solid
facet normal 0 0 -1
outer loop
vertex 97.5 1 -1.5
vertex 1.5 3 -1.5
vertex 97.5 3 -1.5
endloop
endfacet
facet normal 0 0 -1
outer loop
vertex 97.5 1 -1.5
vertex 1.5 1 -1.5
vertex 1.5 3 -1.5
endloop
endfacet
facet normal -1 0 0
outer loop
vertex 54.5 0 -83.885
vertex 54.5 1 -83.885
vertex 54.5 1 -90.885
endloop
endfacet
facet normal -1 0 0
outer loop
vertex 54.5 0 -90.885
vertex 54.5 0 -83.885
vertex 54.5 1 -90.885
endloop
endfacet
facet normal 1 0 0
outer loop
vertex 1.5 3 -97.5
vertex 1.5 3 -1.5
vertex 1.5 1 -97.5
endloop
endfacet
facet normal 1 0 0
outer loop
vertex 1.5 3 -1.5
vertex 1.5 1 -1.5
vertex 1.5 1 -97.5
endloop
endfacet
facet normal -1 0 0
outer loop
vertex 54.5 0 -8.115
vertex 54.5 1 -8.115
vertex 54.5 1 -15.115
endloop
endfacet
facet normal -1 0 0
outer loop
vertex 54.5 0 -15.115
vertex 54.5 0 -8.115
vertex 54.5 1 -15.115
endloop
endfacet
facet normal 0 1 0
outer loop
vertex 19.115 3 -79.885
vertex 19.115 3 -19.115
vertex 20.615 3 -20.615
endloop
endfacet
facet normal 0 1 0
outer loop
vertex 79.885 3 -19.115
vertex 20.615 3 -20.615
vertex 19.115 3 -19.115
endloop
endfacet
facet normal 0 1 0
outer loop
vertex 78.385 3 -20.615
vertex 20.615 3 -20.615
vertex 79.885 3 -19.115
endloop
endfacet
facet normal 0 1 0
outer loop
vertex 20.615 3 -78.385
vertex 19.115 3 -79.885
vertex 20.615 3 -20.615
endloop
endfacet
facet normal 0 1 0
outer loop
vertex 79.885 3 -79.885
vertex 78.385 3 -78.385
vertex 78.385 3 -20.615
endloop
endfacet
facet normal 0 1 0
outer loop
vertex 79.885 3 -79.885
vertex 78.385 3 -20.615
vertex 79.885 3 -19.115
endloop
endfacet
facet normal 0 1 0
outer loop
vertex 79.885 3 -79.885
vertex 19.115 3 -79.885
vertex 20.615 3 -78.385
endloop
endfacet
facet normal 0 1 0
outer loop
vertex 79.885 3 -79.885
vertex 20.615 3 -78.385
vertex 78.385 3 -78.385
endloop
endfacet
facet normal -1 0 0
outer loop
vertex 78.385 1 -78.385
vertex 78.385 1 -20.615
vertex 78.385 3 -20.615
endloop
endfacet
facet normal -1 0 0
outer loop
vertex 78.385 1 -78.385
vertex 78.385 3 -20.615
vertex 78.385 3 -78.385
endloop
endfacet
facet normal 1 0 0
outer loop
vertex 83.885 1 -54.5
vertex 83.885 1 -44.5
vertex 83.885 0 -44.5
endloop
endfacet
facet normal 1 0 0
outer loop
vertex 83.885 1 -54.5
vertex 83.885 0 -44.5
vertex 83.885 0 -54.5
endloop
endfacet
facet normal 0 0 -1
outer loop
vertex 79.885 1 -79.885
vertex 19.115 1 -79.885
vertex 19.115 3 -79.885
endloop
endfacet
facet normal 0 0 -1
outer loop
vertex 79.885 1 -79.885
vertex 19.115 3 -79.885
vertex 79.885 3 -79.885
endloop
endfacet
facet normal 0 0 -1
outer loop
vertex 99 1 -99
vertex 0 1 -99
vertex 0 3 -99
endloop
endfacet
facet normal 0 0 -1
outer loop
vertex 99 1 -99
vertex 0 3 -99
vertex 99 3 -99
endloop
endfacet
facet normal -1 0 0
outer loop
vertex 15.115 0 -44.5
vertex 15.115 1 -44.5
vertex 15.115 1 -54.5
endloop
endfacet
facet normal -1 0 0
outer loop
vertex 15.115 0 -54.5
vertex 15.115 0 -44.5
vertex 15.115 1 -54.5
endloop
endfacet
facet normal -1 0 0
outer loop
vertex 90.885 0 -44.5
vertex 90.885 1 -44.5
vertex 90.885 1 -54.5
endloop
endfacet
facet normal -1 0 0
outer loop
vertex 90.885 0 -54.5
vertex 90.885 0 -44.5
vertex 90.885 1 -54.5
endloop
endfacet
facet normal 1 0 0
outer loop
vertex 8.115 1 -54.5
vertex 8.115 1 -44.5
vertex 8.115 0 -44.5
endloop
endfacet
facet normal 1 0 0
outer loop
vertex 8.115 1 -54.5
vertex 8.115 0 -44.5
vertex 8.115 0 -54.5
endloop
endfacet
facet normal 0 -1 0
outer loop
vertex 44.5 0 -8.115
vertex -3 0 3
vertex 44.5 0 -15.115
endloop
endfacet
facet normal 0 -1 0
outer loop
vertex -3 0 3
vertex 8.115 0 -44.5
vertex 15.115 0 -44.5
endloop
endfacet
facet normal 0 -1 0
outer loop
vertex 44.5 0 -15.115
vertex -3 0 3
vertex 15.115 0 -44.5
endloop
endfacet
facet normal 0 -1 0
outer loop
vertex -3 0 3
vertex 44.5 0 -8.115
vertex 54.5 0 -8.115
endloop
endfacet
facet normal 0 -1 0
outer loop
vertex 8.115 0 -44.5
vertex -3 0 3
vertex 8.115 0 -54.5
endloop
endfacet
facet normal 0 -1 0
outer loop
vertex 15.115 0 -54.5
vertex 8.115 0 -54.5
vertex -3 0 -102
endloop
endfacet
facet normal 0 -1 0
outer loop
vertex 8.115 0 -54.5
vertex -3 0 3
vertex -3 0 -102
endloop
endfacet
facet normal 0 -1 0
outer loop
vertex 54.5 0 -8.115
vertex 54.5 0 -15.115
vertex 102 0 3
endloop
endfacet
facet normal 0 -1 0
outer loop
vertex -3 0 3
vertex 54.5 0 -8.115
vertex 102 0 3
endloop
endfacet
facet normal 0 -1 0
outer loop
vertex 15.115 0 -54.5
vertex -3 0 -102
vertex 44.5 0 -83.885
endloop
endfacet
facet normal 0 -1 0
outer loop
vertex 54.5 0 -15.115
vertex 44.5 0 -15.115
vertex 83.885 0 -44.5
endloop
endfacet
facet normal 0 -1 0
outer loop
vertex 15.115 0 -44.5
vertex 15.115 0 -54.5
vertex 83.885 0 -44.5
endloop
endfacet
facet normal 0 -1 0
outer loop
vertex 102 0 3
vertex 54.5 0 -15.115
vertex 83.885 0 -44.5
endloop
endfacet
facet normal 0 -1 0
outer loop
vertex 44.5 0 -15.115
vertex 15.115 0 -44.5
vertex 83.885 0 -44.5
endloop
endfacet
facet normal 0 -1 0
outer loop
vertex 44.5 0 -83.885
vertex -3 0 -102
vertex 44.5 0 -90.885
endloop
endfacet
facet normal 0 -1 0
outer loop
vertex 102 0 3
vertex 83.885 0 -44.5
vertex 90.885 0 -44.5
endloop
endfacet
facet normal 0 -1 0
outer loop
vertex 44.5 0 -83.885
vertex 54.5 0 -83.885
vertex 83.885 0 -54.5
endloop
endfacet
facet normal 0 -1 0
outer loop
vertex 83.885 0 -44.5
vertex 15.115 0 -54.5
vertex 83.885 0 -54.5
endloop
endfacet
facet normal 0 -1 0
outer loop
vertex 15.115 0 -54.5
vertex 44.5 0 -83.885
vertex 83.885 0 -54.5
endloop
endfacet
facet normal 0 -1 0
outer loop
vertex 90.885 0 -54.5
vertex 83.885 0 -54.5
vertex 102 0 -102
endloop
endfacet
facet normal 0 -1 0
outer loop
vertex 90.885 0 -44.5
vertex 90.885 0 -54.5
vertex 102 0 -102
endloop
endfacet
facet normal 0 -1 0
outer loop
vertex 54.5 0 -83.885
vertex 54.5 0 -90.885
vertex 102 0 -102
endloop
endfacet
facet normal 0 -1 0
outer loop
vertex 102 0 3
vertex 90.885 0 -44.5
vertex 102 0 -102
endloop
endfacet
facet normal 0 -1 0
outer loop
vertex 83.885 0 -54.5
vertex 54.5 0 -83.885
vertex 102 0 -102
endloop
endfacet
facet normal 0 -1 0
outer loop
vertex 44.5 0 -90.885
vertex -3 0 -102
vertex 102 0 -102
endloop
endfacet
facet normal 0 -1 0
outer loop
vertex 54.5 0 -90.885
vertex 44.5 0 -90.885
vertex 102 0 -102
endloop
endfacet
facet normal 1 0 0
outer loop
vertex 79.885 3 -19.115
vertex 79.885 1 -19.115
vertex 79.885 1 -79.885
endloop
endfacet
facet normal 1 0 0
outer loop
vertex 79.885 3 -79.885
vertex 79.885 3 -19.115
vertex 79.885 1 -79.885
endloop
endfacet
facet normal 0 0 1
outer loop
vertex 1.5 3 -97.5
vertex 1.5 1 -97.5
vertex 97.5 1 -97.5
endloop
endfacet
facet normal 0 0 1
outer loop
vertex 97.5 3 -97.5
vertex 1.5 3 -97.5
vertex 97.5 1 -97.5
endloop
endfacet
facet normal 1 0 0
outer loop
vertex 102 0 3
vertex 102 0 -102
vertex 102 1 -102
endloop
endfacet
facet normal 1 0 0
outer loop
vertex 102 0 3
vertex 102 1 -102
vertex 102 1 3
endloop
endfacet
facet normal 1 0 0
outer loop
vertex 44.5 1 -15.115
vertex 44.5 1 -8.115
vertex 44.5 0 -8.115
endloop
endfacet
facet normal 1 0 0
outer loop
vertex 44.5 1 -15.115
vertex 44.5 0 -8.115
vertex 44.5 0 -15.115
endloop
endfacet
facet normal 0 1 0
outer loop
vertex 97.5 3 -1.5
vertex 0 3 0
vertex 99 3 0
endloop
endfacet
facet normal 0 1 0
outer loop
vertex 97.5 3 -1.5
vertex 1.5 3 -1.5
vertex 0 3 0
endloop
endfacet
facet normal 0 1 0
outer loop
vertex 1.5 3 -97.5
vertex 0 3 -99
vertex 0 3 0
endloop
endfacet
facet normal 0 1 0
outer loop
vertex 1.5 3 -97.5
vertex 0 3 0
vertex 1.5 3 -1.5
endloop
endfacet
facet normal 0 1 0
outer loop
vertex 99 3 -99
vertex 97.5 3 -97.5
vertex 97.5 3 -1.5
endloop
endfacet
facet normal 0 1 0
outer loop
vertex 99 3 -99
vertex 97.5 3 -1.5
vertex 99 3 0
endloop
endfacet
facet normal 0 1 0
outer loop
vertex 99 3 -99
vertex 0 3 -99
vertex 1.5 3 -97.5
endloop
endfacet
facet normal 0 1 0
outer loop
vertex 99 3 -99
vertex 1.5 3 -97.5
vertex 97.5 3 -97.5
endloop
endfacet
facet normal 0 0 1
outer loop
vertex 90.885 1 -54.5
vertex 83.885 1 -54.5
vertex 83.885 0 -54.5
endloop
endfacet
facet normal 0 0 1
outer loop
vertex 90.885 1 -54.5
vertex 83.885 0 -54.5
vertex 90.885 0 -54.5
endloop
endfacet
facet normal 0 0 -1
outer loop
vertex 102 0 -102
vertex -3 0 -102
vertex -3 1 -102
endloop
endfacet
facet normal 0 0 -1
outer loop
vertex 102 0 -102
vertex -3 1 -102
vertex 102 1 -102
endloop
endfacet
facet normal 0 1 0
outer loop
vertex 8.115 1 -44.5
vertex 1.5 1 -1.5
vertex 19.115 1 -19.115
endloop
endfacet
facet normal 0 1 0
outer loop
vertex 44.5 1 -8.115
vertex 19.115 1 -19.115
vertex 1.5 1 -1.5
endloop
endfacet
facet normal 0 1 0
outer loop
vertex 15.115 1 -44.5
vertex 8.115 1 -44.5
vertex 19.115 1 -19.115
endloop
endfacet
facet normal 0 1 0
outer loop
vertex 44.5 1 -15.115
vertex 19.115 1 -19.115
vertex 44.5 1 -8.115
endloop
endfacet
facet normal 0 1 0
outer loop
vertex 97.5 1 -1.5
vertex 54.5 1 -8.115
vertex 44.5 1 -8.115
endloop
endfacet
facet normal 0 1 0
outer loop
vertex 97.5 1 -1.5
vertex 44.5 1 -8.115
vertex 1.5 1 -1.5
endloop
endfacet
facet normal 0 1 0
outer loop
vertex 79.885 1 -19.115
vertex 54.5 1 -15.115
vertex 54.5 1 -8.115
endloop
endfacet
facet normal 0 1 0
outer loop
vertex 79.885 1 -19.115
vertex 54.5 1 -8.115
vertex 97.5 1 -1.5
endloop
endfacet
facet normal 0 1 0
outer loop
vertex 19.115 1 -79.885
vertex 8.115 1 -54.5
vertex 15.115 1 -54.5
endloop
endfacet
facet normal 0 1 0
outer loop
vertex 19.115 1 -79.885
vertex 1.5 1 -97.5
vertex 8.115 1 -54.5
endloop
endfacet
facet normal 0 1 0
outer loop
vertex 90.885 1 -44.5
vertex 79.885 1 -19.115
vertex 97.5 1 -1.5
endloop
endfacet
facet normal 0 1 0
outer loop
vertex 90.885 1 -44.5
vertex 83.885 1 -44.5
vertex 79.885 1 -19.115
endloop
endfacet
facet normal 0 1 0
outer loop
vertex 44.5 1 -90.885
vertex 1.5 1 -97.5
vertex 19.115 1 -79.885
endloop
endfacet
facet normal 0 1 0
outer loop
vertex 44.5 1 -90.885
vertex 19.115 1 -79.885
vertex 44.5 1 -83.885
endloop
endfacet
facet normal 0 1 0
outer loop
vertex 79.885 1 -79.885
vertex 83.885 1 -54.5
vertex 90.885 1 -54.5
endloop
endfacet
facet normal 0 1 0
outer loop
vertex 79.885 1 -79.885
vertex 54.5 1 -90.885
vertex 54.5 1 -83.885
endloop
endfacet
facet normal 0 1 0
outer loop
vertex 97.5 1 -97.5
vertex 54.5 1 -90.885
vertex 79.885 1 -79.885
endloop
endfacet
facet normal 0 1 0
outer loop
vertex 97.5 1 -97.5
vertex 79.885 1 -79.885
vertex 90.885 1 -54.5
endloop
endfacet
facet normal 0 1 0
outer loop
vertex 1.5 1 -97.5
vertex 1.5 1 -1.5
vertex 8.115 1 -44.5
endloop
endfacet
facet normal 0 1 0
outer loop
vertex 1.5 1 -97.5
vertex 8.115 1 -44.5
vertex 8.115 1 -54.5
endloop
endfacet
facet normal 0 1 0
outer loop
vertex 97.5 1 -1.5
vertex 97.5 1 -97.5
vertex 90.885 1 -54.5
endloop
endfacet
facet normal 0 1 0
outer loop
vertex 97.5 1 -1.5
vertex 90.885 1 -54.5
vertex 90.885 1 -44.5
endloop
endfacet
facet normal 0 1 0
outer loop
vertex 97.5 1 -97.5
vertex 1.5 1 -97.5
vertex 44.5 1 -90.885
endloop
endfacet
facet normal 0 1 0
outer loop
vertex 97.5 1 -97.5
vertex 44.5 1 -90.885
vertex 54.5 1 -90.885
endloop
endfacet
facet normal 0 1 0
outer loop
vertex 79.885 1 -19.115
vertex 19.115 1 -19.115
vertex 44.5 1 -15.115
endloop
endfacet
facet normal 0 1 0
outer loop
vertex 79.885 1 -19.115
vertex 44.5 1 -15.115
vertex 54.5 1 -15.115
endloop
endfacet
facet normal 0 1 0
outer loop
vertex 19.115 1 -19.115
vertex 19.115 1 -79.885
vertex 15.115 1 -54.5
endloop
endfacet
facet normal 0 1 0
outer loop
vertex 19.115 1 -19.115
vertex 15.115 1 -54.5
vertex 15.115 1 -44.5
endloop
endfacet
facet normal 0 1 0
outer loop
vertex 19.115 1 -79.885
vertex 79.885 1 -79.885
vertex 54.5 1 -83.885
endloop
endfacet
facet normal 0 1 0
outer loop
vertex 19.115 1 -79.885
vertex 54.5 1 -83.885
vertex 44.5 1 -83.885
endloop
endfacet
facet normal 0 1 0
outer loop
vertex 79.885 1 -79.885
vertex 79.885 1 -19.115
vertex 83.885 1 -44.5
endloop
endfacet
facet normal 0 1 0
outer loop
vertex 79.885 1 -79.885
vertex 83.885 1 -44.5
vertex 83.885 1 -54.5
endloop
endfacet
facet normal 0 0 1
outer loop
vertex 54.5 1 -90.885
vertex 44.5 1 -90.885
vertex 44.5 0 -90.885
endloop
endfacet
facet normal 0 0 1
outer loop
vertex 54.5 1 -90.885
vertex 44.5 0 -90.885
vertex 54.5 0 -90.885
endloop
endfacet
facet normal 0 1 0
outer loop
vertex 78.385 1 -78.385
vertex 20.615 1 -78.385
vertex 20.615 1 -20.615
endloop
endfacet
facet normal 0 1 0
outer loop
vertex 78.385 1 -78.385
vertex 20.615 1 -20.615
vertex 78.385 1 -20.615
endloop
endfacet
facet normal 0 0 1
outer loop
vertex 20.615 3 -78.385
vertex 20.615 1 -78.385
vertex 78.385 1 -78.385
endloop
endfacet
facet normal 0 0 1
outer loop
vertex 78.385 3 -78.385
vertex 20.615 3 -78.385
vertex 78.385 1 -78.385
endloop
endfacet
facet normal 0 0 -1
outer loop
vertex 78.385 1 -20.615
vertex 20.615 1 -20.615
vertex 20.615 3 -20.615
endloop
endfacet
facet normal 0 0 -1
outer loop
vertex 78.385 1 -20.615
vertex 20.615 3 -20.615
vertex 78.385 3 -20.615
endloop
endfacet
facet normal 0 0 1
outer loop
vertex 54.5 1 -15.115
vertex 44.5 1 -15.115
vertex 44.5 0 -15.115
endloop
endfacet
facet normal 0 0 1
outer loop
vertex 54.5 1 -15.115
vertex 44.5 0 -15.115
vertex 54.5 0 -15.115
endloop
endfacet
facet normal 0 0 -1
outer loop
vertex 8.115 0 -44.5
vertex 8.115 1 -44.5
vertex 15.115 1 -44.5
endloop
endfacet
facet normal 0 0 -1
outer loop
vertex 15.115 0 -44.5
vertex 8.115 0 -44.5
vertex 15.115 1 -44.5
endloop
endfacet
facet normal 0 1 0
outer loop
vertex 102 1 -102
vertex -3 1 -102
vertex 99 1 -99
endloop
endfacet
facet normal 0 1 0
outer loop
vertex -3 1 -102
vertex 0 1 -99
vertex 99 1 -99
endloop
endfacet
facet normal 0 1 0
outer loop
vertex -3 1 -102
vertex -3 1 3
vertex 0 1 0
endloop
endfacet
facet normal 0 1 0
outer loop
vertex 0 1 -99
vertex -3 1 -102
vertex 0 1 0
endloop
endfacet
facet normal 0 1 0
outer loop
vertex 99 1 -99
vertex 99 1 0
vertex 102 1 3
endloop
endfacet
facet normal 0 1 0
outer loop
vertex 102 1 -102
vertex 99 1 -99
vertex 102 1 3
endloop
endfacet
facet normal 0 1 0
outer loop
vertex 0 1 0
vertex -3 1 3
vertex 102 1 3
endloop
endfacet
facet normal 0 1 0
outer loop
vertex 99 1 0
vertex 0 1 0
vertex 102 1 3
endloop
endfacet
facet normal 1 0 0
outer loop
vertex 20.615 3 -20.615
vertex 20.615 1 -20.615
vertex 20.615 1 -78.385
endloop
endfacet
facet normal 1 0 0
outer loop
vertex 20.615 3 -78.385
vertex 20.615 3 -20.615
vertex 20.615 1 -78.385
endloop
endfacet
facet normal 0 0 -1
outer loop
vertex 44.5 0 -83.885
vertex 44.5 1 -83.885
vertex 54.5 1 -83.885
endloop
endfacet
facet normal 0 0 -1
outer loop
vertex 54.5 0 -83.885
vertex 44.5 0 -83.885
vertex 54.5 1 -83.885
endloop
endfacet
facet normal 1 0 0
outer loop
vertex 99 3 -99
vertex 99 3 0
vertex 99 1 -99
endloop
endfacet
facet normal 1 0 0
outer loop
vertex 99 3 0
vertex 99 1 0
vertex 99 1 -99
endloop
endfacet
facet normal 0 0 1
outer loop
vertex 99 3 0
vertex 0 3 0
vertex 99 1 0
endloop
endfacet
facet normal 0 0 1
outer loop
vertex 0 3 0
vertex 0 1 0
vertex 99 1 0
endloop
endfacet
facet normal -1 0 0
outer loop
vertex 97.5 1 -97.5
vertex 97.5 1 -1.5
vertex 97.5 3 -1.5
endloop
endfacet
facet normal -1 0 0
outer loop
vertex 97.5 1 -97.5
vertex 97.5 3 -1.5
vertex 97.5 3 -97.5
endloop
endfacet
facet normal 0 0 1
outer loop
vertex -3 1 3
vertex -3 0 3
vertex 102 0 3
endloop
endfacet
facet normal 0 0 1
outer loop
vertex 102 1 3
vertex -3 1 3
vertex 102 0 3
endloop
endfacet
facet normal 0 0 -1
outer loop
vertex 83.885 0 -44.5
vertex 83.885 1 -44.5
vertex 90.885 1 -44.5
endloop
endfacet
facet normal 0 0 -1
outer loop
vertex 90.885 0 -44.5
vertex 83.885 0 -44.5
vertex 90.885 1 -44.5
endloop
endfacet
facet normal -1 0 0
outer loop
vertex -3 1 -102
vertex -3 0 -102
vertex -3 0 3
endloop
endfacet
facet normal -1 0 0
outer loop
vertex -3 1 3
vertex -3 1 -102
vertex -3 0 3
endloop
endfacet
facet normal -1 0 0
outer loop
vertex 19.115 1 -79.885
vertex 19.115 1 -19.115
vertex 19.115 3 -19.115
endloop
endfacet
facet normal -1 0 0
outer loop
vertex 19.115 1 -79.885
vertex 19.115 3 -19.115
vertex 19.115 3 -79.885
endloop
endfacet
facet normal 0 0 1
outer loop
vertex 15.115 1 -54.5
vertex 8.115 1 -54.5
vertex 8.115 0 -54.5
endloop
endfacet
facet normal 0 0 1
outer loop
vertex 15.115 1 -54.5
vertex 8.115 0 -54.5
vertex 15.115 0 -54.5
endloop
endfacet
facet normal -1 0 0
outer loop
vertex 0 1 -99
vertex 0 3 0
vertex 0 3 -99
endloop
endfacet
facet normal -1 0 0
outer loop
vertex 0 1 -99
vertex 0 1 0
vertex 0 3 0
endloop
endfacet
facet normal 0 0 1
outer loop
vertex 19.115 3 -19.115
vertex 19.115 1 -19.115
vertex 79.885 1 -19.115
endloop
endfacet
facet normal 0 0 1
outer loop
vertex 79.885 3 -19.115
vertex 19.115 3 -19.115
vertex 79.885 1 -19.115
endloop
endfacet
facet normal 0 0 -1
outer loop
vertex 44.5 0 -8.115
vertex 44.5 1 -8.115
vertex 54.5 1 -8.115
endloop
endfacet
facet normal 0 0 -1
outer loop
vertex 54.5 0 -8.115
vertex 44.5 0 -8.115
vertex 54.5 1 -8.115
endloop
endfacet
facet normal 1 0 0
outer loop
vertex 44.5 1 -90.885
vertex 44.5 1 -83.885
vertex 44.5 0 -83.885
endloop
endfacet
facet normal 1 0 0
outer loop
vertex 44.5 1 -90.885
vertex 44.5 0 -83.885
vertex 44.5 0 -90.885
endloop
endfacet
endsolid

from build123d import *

# Parameters (mm, degrees)
CROQUIS1_W              = 99
CROQUIS1_H              = 99
CROQUIS1_W_2            = 96
CROQUIS1_H_2            = 96
SALIENTE_EXTRUIR1_DEPTH = 2
CROQUIS2_W              = 96
CROQUIS2_H              = 5
CROQUIS2_H_2            = 8.6
SALIENTE_EXTRUIR2_DEPTH = 1
CROQUIS3_W              = 105
CROQUIS3_H              = 105
CROQUIS3_W_2            = 99
CROQUIS3_H_2            = 99
SALIENTE_EXTRUIR3_DEPTH = 1
CROQUIS6_W              = 96
CROQUIS6_H              = 96
SALIENTE_EXTRUIR5_DEPTH = 1
CROQUIS7_W              = 60.769249784
CROQUIS7_H              = 60.769249784
CROQUIS7_W_2            = 57.769249784
CROQUIS7_H_2            = 57.769249784
SALIENTE_EXTRUIR6_DEPTH = 2
CROQUIS8_W              = 10
CROQUIS8_H              = 7
CROQUIS8_W_2            = 7
CROQUIS8_H_2            = 10
CORTAR_EXTRUIR1_DEPTH   = 65
CROQUIS9_W              = 99
CROQUIS9_H              = 99
CROQUIS9_W_2            = 96
CROQUIS9_H_2            = 96
SALIENTE_EXTRUIR7_DEPTH = 1


with BuildPart() as part:
    # Croquis1 → Saliente-Extruir1 (new body)
    with BuildSketch(Plane(origin=(0, 0, 0), x_dir=(1, 0, 0), z_dir=(0, 1, 0))):
        with Locations((49.5, 49.5)):
            Rectangle(CROQUIS1_W, CROQUIS1_H)
        with Locations((49.5, 49.5)):
            Rectangle(CROQUIS1_W_2, CROQUIS1_H_2, mode=Mode.SUBTRACT)
    extrude(amount=SALIENTE_EXTRUIR1_DEPTH)

    # Croquis2 → Saliente-Extruir2 (add)
    with BuildSketch(Plane.XZ):
        with Locations((49.5, -52)):
            Rectangle(CROQUIS2_W, CROQUIS2_H)
        with Locations((49.5, -47)):
            Rectangle(CROQUIS2_W, CROQUIS2_H)
        with Locations((49.5, -67.4)):
            Rectangle(CROQUIS2_W, CROQUIS2_H_2)
        with Locations((49.5, -84.6)):
            Rectangle(CROQUIS2_W, CROQUIS2_H_2)
        with Locations((49.5, -31.6)):
            Rectangle(CROQUIS2_W, CROQUIS2_H_2)
        with Locations((49.5, -14.4)):
            Rectangle(CROQUIS2_W, CROQUIS2_H_2)
    extrude(amount=-SALIENTE_EXTRUIR2_DEPTH)

    # Croquis3 → Saliente-Extruir3 (add)
    with BuildSketch(Plane.XZ):
        with Locations((49.5, -49.5)):
            Rectangle(CROQUIS3_W, CROQUIS3_H)
        with Locations((49.5, -49.5)):
            Rectangle(CROQUIS3_W_2, CROQUIS3_H_2, mode=Mode.SUBTRACT)
    extrude(amount=-SALIENTE_EXTRUIR3_DEPTH)

    # Croquis6 → Saliente-Extruir5 (add)
    with BuildSketch(Plane(origin=(0, 1, 0), x_dir=(1, 0, 0), z_dir=(0, 1, 0))):
        with Locations((49.5, 49.5)):
            Rectangle(CROQUIS6_W, CROQUIS6_H)
    extrude(amount=-SALIENTE_EXTRUIR5_DEPTH)

    # Croquis7 → Saliente-Extruir6 (add)
    with BuildSketch(Plane(origin=(0, 1, 0), x_dir=(1, 0, 0), z_dir=(0, 1, 0))):
        with Locations((49.5, 49.5)):
            Rectangle(CROQUIS7_W, CROQUIS7_H)
        with Locations((49.5, 49.5)):
            Rectangle(CROQUIS7_W_2, CROQUIS7_H_2, mode=Mode.SUBTRACT)
    extrude(amount=SALIENTE_EXTRUIR6_DEPTH)

    # Croquis8 → Cortar-Extruir1 (cut)
    with BuildSketch(Plane(origin=(0, 1, 0), x_dir=(1, 0, 0), z_dir=(0, 1, 0))):
        with Locations((49.5, 11.615375108)):
            Rectangle(CROQUIS8_W, CROQUIS8_H)
        with Locations((11.615375108, 49.5)):
            Rectangle(CROQUIS8_W_2, CROQUIS8_H_2)
        with Locations((49.5, 87.384624892)):
            Rectangle(CROQUIS8_W, CROQUIS8_H)
        with Locations((87.384624892, 49.5)):
            Rectangle(CROQUIS8_W_2, CROQUIS8_H_2)
    extrude(amount=-CORTAR_EXTRUIR1_DEPTH, mode=Mode.SUBTRACT)

    # Croquis9 → Saliente-Extruir7 (add)
    with BuildSketch(Plane(origin=(0, 2, 0), x_dir=(1, 0, 0), z_dir=(0, 1, 0))):
        with Locations((49.5, 49.5)):
            Rectangle(CROQUIS9_W, CROQUIS9_H)
        with Locations((49.5, 49.5)):
            Rectangle(CROQUIS9_W_2, CROQUIS9_H_2, mode=Mode.SUBTRACT)
    extrude(amount=SALIENTE_EXTRUIR7_DEPTH)


solid = part.part
